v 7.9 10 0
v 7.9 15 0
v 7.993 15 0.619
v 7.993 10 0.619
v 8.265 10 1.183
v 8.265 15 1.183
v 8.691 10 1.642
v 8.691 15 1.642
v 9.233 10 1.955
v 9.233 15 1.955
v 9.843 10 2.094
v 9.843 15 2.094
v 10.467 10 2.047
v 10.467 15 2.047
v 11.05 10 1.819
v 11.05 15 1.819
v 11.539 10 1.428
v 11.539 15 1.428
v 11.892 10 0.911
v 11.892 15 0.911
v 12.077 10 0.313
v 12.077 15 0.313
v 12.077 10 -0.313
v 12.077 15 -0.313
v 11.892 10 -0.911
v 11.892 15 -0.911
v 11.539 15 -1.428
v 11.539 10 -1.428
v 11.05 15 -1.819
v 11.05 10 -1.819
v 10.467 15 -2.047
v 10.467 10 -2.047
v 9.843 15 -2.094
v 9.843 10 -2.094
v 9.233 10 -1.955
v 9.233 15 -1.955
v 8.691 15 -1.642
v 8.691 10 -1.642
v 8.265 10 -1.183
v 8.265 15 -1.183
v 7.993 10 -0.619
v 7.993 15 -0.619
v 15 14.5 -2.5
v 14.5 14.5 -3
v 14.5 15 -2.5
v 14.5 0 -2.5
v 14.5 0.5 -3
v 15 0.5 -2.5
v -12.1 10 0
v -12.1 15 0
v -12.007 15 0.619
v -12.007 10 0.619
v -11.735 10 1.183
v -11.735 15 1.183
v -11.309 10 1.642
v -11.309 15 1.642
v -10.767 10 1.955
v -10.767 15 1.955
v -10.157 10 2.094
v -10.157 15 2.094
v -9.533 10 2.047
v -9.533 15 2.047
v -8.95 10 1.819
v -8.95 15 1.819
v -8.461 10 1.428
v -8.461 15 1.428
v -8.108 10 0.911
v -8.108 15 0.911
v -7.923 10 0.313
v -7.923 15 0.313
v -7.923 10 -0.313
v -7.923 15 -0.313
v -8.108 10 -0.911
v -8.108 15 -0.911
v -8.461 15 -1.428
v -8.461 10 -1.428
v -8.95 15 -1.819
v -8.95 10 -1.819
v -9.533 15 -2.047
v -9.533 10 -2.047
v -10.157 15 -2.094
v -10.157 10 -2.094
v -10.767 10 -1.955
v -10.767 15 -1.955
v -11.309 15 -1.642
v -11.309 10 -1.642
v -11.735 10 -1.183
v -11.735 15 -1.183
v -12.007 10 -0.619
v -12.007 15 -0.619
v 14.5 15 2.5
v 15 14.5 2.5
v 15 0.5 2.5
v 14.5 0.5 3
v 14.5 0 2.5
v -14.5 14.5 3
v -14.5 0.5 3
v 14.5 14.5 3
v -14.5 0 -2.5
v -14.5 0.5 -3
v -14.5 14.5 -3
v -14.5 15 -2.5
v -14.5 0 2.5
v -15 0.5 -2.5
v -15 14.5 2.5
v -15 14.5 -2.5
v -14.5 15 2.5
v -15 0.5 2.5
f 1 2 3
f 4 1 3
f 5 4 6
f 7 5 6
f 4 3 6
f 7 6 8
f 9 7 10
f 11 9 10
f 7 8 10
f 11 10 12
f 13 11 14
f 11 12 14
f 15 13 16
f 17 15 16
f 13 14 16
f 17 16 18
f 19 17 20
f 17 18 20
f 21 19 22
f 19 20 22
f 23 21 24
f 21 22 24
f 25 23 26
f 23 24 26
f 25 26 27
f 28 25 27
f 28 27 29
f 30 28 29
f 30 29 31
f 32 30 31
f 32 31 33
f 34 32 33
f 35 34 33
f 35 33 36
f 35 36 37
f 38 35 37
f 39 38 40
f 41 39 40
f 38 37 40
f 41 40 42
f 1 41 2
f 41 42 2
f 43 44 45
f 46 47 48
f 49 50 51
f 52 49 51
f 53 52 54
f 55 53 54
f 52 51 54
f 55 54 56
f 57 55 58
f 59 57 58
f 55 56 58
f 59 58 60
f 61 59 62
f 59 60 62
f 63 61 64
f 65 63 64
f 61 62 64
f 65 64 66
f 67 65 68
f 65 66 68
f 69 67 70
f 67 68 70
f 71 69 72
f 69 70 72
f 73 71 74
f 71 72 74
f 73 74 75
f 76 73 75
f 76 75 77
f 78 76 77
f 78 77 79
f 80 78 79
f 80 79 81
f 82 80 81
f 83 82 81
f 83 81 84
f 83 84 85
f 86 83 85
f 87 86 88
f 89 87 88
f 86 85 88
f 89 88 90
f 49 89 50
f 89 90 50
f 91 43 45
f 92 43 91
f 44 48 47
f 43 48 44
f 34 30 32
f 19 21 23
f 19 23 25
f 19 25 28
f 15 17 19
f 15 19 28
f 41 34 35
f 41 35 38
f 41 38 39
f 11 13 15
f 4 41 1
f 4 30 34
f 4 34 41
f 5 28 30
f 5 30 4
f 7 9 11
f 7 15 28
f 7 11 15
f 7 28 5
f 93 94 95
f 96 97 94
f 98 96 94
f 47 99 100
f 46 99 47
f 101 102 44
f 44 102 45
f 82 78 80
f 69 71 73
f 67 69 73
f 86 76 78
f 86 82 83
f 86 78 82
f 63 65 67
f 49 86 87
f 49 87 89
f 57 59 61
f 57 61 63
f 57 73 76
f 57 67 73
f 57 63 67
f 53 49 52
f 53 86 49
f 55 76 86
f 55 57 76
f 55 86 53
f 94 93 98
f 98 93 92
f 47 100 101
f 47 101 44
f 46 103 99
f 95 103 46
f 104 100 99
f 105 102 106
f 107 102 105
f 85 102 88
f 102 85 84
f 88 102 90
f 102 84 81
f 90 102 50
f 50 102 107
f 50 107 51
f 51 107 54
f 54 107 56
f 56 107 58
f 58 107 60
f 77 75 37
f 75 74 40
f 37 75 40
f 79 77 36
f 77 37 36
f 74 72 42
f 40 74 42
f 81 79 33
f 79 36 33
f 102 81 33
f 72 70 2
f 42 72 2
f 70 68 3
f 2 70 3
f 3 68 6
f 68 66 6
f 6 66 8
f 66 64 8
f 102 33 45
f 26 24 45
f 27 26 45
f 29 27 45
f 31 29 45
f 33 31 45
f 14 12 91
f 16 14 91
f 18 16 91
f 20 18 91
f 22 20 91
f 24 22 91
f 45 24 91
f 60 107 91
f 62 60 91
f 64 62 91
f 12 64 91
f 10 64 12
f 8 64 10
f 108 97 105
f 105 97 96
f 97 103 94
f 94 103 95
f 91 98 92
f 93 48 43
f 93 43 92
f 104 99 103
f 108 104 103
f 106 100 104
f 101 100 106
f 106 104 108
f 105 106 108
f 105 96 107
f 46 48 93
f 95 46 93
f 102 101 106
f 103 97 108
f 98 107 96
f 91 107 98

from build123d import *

# Parameters (mm, degrees)
F0_W     = 30
F0_H     = 6
F1_DEPTH = 15
F2_R     = 2.1
F3_DEPTH = 5
F4_SIZE  = 0.5


with BuildPart() as f1:
    # F0 (on Front) → F1 (new body)
    with BuildSketch(Plane.XZ):
        Rectangle(F0_W, F0_H)
    extrude(amount=-F1_DEPTH)

    # F2 (on face) → F3 (cut)
    with BuildSketch(Plane(origin=(0, 15, 0), x_dir=(-1, 0, 0), z_dir=(0, 1, 0))):
        with Locations((-10, 0)):
            Circle(F2_R)
        with Locations((10, 0)):
            Circle(F2_R)
    extrude(amount=-F3_DEPTH, mode=Mode.SUBTRACT)

    # F4
    f4_edges = [f1.edges().sort_by_distance(p)[0] for p in [
        (15, 7.5, 3),
        (-15, 7.5, 3),
        (0, 0, 3),
        (0, 15, 3),
        (-15, 7.5, -3),
        (15, 7.5, -3),
        (0, 0, -3),
        (0, 15, -3),
        (15, 0, 0),
        (15, 15, 0),
        (-15, 0, 0),
        (-15, 15, 0),
    ]]
    chamfer(f4_edges, length=F4_SIZE)


solid = f1.part
